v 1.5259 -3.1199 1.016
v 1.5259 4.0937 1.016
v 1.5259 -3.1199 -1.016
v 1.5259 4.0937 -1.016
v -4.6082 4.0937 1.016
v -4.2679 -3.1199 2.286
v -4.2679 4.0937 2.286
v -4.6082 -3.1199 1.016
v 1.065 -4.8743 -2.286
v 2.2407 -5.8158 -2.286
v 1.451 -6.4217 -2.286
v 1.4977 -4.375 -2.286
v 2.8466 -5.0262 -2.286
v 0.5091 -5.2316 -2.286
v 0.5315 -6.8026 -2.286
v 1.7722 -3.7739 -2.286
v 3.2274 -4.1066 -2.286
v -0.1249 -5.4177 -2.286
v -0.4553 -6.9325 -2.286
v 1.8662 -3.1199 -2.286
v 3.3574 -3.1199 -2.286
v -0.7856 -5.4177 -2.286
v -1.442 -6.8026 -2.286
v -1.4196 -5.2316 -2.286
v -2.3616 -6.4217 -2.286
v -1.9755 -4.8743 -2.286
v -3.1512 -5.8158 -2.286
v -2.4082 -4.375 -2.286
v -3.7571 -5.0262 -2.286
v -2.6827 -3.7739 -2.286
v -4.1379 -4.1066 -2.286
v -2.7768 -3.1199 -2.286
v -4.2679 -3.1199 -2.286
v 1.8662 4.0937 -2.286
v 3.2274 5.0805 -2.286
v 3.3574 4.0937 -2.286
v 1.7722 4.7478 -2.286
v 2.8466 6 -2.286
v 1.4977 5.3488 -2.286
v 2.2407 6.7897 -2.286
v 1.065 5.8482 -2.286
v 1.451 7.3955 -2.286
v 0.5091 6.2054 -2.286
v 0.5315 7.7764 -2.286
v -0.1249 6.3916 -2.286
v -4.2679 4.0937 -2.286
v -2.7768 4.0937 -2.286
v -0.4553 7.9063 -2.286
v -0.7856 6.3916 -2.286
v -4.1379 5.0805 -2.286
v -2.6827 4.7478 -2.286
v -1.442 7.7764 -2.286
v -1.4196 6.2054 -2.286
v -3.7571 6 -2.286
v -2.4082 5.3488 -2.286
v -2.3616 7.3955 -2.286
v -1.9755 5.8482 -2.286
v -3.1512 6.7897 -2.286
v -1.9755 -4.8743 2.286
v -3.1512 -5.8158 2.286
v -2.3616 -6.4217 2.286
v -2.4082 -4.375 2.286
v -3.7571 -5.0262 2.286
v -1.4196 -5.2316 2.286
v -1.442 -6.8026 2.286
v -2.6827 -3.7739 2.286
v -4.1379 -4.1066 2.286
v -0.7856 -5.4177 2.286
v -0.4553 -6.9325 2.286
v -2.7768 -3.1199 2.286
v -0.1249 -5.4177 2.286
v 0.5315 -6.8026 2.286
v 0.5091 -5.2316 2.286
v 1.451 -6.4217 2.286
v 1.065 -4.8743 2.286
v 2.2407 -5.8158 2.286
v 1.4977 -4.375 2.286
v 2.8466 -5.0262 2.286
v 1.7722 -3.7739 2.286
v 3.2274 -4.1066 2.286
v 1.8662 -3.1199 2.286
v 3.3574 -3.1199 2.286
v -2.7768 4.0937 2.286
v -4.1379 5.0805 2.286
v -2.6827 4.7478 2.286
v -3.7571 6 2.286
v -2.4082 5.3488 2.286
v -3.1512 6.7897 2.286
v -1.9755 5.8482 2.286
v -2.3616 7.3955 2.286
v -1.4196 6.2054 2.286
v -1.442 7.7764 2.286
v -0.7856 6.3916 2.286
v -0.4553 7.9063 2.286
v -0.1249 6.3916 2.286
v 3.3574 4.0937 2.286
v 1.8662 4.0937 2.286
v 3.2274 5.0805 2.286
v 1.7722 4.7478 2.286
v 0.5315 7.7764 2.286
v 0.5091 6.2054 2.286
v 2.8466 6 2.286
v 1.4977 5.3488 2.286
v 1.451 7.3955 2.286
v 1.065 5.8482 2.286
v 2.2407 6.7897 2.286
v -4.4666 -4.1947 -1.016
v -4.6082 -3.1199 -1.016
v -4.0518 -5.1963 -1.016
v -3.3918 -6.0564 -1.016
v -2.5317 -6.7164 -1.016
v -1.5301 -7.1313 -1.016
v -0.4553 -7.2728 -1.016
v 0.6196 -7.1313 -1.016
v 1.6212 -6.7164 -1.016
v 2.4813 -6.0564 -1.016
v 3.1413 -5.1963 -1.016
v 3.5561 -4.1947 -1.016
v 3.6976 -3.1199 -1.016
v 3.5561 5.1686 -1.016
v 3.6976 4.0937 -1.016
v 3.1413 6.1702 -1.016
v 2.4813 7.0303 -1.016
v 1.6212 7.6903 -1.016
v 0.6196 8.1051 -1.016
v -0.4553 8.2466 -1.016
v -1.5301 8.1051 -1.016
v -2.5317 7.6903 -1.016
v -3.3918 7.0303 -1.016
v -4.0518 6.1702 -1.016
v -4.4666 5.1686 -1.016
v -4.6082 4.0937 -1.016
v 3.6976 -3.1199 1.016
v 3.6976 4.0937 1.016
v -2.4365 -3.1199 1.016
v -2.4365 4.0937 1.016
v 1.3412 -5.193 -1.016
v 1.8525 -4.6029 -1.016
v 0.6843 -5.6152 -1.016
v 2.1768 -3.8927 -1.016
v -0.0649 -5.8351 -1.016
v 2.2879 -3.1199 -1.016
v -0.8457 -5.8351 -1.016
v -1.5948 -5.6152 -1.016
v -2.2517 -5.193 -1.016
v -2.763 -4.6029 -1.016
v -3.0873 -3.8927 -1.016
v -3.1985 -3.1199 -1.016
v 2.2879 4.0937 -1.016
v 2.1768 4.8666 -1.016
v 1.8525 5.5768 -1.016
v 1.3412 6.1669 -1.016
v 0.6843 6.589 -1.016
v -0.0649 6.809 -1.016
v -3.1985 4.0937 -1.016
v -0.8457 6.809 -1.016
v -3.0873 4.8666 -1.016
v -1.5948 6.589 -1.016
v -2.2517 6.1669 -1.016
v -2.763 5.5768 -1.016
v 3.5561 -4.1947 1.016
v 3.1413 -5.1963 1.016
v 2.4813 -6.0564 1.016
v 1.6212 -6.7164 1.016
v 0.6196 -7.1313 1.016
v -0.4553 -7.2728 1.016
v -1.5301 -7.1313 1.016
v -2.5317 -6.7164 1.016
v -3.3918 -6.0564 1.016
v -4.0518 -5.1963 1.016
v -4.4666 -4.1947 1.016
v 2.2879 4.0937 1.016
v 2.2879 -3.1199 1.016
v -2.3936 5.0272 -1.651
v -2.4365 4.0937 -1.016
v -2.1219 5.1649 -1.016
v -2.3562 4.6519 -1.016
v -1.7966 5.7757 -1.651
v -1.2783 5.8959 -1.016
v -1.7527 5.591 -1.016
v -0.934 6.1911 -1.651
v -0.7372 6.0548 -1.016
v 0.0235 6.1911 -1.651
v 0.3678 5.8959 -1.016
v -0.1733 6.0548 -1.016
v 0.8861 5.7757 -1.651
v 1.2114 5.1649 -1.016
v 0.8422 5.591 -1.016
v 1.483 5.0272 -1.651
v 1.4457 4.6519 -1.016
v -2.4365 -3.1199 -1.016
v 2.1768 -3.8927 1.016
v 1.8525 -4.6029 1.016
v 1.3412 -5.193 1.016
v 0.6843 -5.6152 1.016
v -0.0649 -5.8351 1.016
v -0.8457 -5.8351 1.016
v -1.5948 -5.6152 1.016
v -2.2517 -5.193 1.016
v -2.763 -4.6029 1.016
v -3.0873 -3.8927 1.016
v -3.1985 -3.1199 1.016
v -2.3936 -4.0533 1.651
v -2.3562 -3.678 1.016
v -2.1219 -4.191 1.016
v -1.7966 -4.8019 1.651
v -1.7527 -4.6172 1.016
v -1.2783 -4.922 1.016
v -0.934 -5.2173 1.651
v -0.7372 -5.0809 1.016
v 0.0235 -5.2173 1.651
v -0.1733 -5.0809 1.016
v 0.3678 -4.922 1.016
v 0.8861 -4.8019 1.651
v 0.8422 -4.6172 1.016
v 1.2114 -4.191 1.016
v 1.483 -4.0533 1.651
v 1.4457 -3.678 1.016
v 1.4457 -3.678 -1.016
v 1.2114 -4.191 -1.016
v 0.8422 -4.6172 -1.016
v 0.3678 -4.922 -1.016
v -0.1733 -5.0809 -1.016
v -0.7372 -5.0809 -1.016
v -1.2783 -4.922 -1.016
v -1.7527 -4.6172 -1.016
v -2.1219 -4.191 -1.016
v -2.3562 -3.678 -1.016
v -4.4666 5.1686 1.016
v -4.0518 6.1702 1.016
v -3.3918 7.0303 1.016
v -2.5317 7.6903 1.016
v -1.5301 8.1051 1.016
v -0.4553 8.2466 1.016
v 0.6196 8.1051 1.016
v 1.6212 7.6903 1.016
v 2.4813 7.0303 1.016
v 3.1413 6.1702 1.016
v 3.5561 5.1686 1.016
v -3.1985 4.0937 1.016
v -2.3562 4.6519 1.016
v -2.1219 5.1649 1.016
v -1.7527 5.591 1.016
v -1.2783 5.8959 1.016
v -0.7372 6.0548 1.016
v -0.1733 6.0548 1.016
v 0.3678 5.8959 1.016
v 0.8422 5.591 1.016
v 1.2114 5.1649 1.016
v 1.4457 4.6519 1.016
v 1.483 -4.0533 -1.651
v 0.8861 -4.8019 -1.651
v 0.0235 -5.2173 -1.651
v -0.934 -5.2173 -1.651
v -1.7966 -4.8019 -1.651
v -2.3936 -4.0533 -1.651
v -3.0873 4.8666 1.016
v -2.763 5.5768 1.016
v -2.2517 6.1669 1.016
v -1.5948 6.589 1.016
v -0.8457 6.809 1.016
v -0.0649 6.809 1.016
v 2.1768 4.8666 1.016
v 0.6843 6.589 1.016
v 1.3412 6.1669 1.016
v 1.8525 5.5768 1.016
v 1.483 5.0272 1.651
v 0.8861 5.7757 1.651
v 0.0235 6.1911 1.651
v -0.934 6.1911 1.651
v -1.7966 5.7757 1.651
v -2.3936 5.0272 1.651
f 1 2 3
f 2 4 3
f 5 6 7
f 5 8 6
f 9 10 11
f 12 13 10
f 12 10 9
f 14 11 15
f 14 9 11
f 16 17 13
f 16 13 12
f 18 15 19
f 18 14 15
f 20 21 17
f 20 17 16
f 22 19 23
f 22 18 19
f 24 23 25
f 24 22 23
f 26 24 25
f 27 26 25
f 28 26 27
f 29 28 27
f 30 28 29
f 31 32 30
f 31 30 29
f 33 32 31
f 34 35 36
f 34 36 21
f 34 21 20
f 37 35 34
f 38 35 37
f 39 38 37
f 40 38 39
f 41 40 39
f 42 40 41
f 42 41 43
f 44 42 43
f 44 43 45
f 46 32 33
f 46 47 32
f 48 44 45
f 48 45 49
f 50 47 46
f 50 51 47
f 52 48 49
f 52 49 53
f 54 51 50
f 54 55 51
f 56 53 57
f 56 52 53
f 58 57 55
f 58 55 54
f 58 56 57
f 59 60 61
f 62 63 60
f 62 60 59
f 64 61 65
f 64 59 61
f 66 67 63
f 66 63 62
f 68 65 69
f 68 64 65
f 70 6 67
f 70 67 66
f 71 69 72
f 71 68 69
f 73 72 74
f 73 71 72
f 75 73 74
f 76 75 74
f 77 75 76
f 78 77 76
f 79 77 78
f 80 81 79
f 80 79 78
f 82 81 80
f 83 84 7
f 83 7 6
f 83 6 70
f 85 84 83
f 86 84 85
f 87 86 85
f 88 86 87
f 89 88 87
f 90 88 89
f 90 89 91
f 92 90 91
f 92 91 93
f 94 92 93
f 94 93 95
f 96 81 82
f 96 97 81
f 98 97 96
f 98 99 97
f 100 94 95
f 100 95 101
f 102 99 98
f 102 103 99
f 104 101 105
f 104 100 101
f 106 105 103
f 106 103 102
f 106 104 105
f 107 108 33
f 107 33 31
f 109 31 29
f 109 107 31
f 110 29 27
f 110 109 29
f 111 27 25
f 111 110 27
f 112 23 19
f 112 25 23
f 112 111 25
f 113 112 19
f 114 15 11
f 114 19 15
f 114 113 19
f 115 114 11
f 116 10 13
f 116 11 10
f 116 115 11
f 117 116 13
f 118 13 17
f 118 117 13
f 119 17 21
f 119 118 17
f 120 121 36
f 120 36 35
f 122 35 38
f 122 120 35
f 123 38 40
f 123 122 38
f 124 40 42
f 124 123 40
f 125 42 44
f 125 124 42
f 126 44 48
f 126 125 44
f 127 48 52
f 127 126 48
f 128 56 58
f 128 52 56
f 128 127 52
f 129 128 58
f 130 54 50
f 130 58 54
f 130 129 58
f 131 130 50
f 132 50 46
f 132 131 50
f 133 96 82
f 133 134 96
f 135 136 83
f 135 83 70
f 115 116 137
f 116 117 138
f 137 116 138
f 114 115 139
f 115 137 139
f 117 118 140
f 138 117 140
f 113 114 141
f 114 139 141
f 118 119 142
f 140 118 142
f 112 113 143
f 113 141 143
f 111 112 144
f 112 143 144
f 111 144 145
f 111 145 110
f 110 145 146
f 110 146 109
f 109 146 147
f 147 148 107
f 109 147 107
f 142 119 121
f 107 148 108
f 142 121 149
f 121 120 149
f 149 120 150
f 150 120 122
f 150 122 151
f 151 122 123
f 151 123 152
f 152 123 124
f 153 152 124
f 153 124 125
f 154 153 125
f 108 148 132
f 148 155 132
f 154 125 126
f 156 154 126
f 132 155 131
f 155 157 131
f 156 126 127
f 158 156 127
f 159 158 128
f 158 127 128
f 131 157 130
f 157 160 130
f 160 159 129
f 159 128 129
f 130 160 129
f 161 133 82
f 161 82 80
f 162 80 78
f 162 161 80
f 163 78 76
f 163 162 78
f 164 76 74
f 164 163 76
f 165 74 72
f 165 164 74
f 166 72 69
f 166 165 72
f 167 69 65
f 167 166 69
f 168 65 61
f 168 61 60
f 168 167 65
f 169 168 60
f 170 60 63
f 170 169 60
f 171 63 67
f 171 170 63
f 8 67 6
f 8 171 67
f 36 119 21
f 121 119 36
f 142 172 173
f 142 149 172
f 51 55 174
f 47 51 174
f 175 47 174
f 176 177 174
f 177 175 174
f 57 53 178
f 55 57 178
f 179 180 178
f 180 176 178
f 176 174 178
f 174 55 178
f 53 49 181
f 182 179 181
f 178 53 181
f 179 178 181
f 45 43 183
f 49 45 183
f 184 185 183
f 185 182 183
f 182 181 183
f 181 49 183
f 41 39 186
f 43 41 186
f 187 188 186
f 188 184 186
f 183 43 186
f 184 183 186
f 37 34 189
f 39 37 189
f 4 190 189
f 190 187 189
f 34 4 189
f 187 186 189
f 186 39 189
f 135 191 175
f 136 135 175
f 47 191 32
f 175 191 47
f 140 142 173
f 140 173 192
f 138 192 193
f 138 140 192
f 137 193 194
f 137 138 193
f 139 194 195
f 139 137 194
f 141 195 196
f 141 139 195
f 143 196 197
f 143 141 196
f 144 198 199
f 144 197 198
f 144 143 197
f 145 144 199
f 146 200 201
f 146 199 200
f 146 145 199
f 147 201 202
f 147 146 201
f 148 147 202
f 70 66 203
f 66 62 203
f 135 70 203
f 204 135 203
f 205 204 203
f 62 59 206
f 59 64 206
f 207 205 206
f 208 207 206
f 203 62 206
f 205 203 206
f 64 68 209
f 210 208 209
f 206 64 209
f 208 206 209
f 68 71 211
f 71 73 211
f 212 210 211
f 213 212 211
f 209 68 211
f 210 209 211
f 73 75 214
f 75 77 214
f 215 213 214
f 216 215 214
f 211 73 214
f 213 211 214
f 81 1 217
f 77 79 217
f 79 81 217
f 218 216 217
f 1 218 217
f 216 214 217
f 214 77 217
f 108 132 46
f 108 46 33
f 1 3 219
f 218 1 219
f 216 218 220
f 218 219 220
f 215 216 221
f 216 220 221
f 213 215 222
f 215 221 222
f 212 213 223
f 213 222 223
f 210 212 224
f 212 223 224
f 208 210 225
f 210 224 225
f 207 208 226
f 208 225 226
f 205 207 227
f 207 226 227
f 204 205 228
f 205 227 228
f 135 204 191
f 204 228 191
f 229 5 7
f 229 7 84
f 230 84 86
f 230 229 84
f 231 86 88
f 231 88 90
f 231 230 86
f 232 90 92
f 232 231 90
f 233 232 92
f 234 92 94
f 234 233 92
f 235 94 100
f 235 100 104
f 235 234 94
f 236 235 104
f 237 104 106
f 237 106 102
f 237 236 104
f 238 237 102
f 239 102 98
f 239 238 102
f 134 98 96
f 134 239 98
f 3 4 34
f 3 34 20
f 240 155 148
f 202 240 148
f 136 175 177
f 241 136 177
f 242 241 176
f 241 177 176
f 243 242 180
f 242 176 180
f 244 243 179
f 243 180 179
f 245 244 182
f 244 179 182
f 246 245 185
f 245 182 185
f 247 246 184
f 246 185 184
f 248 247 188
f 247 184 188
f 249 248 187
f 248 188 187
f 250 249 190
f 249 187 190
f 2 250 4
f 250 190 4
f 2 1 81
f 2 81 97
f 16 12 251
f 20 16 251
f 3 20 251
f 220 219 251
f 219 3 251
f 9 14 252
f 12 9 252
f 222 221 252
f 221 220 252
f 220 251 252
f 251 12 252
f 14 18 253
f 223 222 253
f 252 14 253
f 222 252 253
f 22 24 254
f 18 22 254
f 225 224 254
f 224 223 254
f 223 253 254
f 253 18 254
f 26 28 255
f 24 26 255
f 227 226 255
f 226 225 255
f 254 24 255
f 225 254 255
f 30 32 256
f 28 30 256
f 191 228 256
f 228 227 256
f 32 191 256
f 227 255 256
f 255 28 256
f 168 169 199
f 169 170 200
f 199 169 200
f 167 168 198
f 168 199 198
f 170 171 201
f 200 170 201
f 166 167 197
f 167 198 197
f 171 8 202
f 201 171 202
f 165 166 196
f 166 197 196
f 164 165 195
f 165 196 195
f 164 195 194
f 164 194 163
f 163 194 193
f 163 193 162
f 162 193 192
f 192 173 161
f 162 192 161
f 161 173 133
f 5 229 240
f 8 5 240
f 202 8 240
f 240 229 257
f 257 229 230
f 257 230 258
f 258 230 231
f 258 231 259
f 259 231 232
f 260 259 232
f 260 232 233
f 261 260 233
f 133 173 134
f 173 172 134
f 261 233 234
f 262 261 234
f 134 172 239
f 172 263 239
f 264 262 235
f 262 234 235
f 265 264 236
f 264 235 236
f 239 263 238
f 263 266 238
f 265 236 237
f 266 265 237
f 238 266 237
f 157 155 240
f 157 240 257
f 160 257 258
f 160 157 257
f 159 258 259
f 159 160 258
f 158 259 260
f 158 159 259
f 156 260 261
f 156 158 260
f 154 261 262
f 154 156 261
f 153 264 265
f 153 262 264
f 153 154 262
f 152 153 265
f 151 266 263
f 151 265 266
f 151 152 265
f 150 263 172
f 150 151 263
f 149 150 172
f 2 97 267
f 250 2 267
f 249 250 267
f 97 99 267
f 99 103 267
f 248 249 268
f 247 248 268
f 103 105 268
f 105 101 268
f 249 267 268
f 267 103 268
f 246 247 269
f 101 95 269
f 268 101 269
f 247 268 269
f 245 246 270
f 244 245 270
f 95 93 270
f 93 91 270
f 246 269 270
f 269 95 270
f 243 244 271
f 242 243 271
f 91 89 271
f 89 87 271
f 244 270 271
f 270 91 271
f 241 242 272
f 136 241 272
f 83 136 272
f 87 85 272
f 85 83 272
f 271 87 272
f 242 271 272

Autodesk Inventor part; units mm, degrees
ref_plane "YZ Plane" through (0, 0, 0) normal (1, 0, 0) x (0, 1, 0)
ref_plane "XZ Plane" through (0, 0, 0) normal (0, 1, 0) x (-1, 0, 0)
ref_plane "XY Plane" through (0, 0, 0) normal (0, 0, 1) x (1, 0, 0)
sketch "Sketch1" plane through (0, 0, 0) normal (0, 0, 1) x (1, 0, 0)
  arc A0 (2.287945, 4.093737) -> (-3.198455, 4.093737) centre (-0.455255, 4.093737) ccw
  arc A1 (-3.198455, -3.119863) -> (2.287945, -3.119863) centre (-0.455255, -3.119863) ccw
  line L0 (-3.198455, 4.093737) -> (-3.198455, -3.119863)
  line L1 (2.287945, 4.093737) -> (2.287945, -3.119863)
  arc A2 (1.525945, 4.093737) -> (-2.436455, 4.093737) centre (-0.455255, 4.093737) ccw
  line L2 (1.525945, 4.093737) -> (1.525945, -3.119863)
  arc A3 (-2.436455, -3.119863) -> (1.525945, -3.119863) centre (-0.455255, -3.119863) ccw
  line L3 (-2.436455, -3.119863) -> (-2.436455, 4.093737)
  point P0 (0, 0)
  dimension "d0" = 5.4864
  dimension "d1" = 5.4864
  dimension "d3" = 12.7
  dimension "d4" = 0.762
extrude "Extrusion1" add sketch "Sketch1" along normal mid plane 2.032
sketch "Sketch2" plane through (0, 0, 1.016) normal (0, 0, 1) x (1, 0, 0)
  line L0 (1.525945, -3.119863) -> (1.525945, 4.093737)
  arc A0 (1.525945, 4.093737) -> (-2.436455, 4.093737) centre (-0.455255, 4.093737) ccw
  line L1 (-2.436455, 4.093737) -> (-2.436455, -3.119863)
  arc A1 (-2.436455, -3.119863) -> (1.525945, -3.119863) centre (-0.455255, -3.119863) ccw
  line L2 (2.287945, 4.093737) -> (2.287945, -3.119863)
  arc A2 (-3.198455, -3.119863) -> (2.287945, -3.119863) centre (-0.455255, -3.119863) ccw
  line L3 (-3.198455, -3.119863) -> (-3.198455, 4.093737)
  arc A3 (2.287945, 4.093737) -> (-3.198455, 4.093737) centre (-0.455255, 4.093737) ccw
  arc A4 (3.697645, 4.093737) -> (-4.608155, 4.093737) centre (-0.455255, 4.093737) ccw
  line L4 (3.697645, 4.093737) -> (3.697645, -3.119863)
  arc A5 (-4.608155, -3.119863) -> (3.697645, -3.119863) centre (-0.455255, -3.119863) ccw
  line L5 (-4.608155, -3.119863) -> (-4.608155, 4.093737)
  point P0 (0, 0)
  dimension "d7" = 8.3058
sketch "Sketch2 outline for Extrusion2" plane through (0, 0, 1.016) normal (0, 0, 1) x (1, 0, 0)
  arc A0 (-4.608155, 4.093737) -> (3.697645, 4.093737) centre (-0.455255, 4.093737) cw
  line L0 (-4.608155, -3.119863) -> (-4.608155, 4.093737)
  line L1 (3.697645, 4.093737) -> (3.697645, -3.119863)
  arc A1 (3.697645, -3.119863) -> (-4.608155, -3.119863) centre (-0.455255, -3.119863) cw
  arc A2 (-2.436455, -3.119863) -> (1.525945, -3.119863) centre (-0.455255, -3.119863) ccw
  line L2 (1.525945, -3.119863) -> (1.525945, 4.093737)
  arc A3 (1.525945, 4.093737) -> (-2.436455, 4.093737) centre (-0.455255, 4.093737) ccw
  line L3 (-2.436455, 4.093737) -> (-2.436455, -3.119863)
extrude "Extrusion2" add sketch "Sketch2 outline for Extrusion2" along normal blind 1.27 draft -15
mirror "Mirror1" about plane through (0, 0, 0) normal (0, 0, 1) of "Extrusion2"
properties part number "Nibblets"
